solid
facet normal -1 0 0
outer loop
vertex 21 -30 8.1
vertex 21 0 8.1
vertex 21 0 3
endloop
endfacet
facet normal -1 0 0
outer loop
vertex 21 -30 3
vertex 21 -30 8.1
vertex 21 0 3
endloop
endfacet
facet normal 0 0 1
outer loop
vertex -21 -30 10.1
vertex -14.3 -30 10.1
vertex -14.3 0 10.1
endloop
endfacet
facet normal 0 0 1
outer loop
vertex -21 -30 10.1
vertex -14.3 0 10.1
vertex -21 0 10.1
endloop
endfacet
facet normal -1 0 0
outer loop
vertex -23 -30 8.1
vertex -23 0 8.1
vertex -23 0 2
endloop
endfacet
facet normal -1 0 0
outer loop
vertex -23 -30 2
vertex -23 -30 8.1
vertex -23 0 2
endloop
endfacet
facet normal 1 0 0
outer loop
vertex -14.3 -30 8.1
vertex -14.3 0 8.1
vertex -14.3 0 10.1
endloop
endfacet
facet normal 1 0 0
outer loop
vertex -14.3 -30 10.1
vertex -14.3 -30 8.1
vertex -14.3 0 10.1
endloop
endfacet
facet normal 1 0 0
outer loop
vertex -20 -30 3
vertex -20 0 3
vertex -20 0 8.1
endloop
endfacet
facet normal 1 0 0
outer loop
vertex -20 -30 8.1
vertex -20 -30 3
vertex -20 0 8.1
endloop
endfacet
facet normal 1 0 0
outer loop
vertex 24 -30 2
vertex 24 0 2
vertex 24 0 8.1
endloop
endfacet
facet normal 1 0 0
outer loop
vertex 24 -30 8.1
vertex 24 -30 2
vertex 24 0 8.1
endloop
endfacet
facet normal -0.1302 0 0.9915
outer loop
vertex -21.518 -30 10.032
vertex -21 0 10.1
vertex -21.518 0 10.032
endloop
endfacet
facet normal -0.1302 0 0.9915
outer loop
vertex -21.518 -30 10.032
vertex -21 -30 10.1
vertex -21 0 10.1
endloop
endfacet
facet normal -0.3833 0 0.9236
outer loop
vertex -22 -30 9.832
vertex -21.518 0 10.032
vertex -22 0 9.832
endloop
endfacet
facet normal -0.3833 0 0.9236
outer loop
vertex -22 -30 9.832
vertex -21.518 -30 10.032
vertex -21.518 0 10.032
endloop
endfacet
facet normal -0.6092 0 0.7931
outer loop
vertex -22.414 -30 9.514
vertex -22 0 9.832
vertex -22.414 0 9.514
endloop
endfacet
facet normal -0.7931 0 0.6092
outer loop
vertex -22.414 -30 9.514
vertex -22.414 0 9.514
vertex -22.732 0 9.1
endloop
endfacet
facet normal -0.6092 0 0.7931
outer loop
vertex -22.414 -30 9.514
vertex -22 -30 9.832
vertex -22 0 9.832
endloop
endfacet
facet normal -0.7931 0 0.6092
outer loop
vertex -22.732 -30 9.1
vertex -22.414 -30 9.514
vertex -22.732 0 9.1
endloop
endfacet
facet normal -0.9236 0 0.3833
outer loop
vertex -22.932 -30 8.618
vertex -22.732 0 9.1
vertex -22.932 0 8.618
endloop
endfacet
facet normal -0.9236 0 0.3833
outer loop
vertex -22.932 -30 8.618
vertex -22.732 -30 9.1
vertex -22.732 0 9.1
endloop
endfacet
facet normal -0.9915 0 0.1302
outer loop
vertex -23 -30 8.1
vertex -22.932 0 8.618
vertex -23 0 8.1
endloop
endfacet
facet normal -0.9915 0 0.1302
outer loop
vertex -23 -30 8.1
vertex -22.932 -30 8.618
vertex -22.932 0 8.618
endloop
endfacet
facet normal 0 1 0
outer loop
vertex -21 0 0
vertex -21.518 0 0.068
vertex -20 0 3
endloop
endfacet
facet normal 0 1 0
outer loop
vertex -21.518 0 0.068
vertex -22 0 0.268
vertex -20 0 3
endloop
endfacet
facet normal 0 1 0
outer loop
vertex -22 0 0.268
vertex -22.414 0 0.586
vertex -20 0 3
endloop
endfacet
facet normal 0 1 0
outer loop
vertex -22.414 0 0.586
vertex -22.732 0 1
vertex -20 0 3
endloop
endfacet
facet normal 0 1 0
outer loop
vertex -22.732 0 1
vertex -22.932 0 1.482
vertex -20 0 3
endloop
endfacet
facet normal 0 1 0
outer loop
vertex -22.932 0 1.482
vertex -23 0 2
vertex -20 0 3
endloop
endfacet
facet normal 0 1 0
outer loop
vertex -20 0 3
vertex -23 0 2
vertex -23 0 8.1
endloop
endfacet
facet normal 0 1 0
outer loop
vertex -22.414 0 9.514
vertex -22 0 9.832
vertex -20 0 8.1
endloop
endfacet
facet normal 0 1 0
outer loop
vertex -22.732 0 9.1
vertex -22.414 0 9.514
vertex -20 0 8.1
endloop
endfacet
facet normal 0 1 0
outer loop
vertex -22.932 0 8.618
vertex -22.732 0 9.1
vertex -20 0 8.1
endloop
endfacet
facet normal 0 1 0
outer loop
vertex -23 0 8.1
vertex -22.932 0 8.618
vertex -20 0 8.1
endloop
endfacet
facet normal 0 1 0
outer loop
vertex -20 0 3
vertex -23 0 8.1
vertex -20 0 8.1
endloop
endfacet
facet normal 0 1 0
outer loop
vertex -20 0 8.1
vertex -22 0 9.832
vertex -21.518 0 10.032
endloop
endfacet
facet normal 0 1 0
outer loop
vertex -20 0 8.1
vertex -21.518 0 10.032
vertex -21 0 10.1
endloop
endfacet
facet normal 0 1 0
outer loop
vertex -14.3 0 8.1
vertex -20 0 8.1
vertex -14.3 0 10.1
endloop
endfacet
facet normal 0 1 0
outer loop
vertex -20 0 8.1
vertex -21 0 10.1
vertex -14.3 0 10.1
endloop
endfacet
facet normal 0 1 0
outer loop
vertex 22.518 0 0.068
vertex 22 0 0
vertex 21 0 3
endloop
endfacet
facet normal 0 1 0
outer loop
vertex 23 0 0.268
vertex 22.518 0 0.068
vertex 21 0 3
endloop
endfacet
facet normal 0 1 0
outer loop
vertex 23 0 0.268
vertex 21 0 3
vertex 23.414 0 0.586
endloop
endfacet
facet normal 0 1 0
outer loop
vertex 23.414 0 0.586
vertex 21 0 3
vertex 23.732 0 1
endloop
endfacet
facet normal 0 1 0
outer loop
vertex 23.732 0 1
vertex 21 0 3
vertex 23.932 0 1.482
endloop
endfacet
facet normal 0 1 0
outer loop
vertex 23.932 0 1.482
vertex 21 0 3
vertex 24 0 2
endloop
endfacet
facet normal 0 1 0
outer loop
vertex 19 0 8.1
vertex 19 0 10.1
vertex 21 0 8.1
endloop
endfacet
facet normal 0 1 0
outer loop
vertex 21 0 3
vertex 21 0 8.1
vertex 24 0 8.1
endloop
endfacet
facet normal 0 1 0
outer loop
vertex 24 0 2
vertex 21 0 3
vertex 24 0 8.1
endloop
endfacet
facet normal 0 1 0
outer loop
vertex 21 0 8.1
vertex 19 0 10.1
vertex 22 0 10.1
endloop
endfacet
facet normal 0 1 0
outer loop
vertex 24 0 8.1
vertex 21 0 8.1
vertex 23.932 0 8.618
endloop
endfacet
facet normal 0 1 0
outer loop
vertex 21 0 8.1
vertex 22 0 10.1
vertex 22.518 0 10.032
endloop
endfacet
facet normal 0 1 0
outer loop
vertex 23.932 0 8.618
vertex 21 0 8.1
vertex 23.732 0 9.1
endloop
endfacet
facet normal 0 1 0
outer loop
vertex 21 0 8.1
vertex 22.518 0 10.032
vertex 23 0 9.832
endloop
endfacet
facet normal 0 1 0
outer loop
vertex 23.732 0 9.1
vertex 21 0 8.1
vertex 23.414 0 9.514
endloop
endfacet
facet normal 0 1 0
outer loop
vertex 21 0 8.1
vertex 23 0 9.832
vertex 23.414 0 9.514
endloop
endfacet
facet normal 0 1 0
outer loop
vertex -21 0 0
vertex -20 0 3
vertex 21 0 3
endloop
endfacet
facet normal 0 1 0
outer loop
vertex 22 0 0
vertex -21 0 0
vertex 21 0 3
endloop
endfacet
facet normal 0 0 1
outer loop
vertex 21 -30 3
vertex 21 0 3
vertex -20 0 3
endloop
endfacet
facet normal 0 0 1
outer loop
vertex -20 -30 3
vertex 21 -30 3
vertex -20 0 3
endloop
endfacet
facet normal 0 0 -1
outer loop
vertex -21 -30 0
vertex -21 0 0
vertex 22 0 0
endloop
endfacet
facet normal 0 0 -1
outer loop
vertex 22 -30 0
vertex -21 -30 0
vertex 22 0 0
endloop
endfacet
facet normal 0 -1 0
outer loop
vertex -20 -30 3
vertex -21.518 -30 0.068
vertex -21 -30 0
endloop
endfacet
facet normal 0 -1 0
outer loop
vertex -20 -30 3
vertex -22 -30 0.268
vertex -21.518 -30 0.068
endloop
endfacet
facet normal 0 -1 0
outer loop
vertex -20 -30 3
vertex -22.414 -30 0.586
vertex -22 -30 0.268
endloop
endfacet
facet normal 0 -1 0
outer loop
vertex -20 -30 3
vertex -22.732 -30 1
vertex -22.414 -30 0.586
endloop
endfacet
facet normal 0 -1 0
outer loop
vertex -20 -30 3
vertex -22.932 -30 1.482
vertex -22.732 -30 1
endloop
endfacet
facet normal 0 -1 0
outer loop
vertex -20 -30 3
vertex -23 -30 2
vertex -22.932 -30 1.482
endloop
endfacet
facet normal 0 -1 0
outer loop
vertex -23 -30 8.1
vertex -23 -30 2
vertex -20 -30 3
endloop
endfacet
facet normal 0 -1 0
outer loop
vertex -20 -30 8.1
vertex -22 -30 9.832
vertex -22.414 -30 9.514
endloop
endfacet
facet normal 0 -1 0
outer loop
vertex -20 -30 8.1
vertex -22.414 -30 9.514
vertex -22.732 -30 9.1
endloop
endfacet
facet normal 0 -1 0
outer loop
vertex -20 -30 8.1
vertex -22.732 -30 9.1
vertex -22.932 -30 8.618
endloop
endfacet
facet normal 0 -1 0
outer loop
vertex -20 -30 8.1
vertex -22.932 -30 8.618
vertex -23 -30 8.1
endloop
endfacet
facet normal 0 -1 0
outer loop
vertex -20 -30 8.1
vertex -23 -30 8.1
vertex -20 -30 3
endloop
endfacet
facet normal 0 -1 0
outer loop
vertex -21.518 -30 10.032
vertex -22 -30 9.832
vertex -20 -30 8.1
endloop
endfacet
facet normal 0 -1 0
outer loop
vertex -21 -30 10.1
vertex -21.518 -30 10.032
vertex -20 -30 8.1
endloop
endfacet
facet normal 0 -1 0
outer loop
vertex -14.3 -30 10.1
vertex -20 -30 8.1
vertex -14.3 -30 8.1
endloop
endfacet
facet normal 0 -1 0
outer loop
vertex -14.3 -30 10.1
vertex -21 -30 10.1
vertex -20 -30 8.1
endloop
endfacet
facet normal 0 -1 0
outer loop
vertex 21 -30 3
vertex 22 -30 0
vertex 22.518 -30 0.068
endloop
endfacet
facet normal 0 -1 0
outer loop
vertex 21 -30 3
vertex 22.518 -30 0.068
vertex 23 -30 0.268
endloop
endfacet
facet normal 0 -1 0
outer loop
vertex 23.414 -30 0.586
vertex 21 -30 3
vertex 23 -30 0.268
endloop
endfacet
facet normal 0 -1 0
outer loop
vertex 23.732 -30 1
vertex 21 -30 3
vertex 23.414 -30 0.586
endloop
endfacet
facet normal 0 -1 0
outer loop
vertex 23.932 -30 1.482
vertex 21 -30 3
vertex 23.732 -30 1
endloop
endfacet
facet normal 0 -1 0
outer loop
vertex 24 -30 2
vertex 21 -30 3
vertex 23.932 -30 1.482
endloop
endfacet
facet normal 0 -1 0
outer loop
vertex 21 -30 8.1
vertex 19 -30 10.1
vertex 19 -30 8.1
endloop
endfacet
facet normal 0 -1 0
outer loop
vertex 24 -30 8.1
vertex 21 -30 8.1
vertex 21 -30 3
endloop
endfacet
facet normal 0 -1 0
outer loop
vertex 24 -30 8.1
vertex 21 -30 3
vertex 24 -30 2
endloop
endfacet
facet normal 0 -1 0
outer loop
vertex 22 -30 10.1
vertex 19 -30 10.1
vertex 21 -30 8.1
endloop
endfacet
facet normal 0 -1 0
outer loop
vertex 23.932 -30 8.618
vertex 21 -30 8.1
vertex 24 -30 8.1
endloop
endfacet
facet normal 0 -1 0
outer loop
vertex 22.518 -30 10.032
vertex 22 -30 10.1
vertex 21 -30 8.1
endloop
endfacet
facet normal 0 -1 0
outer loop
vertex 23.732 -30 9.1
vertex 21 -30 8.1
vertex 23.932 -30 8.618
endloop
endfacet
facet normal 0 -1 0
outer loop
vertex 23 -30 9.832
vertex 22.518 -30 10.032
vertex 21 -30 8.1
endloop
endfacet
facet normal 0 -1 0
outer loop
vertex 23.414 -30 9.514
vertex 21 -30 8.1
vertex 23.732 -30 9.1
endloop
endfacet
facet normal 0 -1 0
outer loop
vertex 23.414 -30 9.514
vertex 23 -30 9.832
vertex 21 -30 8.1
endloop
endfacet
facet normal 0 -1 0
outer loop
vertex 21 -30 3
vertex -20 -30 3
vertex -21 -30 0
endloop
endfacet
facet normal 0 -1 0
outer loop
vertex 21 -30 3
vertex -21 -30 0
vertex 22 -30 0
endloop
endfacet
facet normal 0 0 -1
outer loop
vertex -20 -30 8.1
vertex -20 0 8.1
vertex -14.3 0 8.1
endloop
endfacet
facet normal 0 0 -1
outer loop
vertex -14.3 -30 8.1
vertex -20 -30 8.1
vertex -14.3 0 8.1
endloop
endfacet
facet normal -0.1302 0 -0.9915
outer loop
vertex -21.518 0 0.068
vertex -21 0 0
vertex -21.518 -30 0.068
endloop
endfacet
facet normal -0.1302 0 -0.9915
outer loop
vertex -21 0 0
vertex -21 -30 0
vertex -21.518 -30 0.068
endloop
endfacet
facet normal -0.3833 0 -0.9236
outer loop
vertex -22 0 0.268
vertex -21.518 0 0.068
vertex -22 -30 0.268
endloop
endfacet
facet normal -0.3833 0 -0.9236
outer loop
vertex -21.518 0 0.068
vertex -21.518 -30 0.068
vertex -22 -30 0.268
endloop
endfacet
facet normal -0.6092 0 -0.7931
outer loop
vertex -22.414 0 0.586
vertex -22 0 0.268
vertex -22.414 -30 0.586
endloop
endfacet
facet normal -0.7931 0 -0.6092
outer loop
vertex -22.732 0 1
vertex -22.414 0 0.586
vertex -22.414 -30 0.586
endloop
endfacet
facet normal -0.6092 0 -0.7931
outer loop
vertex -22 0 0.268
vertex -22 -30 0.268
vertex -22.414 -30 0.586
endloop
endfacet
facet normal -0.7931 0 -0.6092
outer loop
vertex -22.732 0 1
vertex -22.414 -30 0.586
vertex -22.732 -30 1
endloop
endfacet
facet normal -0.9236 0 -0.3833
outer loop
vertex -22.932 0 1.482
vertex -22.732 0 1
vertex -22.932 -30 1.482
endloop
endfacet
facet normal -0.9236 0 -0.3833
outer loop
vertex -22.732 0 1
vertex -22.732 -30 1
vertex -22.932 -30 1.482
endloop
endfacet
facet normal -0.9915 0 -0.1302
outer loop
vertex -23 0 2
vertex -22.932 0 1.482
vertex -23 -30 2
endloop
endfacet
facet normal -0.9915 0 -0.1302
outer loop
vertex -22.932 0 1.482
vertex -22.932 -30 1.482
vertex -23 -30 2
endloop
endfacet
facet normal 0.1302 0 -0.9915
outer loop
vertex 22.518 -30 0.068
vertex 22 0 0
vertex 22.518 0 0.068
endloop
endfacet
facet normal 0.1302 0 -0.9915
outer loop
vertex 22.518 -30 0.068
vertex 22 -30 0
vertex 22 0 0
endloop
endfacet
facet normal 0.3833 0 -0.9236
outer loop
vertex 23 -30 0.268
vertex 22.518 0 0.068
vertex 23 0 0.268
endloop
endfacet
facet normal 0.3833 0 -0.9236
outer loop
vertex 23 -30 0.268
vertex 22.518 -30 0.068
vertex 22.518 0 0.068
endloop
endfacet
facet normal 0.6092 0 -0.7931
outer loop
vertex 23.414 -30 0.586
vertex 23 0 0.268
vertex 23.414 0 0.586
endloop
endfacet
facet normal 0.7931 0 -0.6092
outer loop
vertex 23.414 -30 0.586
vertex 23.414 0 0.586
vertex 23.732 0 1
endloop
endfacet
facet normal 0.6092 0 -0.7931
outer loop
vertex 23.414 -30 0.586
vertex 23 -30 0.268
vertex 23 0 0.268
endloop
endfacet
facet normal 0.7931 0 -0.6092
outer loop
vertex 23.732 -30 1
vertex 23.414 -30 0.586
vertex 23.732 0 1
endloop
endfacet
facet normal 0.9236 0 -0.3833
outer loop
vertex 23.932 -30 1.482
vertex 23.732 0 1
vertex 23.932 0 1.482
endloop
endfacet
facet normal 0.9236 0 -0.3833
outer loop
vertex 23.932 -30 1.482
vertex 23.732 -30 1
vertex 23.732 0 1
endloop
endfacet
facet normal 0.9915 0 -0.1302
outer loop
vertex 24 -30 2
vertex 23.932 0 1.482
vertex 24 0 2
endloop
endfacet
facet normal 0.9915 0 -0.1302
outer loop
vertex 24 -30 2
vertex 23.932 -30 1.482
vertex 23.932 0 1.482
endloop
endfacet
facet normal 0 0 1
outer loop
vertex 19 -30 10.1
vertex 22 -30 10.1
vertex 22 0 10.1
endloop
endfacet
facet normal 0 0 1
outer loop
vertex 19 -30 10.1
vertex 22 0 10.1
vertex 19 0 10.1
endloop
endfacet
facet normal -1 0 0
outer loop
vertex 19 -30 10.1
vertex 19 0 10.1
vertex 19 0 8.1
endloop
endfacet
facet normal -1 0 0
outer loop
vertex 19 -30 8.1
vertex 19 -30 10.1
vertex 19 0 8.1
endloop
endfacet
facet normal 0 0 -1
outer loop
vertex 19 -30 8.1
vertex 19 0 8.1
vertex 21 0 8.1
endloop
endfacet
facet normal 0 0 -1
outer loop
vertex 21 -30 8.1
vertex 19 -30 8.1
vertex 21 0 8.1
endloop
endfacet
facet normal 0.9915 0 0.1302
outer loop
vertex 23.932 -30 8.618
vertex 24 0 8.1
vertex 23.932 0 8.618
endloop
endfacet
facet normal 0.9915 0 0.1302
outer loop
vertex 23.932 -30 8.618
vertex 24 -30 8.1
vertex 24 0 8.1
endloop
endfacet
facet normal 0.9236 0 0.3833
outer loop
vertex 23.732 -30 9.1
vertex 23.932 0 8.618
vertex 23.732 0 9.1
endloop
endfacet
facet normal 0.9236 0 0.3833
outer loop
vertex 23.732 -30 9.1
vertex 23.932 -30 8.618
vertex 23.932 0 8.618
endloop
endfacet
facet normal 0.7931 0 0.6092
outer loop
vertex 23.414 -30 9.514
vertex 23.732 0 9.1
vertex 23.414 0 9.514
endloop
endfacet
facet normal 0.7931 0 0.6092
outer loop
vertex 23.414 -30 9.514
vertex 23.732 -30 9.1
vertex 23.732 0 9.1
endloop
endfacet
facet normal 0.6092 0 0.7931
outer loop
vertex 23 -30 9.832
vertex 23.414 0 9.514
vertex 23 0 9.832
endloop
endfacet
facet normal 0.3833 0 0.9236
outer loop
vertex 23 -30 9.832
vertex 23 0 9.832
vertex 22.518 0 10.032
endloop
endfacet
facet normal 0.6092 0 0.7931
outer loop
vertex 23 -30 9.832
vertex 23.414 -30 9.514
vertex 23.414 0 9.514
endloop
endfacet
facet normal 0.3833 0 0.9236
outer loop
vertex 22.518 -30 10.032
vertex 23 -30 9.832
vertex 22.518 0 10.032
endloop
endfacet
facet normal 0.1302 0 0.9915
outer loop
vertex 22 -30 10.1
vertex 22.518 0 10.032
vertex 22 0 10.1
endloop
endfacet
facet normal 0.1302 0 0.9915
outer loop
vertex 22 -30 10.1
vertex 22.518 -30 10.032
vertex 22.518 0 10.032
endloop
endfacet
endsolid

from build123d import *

# Parameters (mm, degrees)
F1_DEPTH = 30
F2_R     = 2


with BuildPart() as f1:
    # F0 (on Front) → F1 (new body)
    with BuildSketch(Plane.XZ):
        Polygon((-23, 0), (0, 0), (24, 0), (24, 10.1), (19, 10.1), (19, 8.1), (21, 8.1), (21, 3), (0, 3), (-20, 3), (-20, 8.1), (-14.3, 8.1), (-14.3, 10.1), (-23, 10.1), align=None)
    extrude(amount=F1_DEPTH)

    # F2
    f2_edges = [f1.edges().sort_by_distance(p)[0] for p in [
        (-23, -15, 10.1),
        (24, -15, 10.1),
        (-23, -15, 0),
        (24, -15, 0),
    ]]
    fillet(f2_edges, radius=F2_R)


solid = f1.part
